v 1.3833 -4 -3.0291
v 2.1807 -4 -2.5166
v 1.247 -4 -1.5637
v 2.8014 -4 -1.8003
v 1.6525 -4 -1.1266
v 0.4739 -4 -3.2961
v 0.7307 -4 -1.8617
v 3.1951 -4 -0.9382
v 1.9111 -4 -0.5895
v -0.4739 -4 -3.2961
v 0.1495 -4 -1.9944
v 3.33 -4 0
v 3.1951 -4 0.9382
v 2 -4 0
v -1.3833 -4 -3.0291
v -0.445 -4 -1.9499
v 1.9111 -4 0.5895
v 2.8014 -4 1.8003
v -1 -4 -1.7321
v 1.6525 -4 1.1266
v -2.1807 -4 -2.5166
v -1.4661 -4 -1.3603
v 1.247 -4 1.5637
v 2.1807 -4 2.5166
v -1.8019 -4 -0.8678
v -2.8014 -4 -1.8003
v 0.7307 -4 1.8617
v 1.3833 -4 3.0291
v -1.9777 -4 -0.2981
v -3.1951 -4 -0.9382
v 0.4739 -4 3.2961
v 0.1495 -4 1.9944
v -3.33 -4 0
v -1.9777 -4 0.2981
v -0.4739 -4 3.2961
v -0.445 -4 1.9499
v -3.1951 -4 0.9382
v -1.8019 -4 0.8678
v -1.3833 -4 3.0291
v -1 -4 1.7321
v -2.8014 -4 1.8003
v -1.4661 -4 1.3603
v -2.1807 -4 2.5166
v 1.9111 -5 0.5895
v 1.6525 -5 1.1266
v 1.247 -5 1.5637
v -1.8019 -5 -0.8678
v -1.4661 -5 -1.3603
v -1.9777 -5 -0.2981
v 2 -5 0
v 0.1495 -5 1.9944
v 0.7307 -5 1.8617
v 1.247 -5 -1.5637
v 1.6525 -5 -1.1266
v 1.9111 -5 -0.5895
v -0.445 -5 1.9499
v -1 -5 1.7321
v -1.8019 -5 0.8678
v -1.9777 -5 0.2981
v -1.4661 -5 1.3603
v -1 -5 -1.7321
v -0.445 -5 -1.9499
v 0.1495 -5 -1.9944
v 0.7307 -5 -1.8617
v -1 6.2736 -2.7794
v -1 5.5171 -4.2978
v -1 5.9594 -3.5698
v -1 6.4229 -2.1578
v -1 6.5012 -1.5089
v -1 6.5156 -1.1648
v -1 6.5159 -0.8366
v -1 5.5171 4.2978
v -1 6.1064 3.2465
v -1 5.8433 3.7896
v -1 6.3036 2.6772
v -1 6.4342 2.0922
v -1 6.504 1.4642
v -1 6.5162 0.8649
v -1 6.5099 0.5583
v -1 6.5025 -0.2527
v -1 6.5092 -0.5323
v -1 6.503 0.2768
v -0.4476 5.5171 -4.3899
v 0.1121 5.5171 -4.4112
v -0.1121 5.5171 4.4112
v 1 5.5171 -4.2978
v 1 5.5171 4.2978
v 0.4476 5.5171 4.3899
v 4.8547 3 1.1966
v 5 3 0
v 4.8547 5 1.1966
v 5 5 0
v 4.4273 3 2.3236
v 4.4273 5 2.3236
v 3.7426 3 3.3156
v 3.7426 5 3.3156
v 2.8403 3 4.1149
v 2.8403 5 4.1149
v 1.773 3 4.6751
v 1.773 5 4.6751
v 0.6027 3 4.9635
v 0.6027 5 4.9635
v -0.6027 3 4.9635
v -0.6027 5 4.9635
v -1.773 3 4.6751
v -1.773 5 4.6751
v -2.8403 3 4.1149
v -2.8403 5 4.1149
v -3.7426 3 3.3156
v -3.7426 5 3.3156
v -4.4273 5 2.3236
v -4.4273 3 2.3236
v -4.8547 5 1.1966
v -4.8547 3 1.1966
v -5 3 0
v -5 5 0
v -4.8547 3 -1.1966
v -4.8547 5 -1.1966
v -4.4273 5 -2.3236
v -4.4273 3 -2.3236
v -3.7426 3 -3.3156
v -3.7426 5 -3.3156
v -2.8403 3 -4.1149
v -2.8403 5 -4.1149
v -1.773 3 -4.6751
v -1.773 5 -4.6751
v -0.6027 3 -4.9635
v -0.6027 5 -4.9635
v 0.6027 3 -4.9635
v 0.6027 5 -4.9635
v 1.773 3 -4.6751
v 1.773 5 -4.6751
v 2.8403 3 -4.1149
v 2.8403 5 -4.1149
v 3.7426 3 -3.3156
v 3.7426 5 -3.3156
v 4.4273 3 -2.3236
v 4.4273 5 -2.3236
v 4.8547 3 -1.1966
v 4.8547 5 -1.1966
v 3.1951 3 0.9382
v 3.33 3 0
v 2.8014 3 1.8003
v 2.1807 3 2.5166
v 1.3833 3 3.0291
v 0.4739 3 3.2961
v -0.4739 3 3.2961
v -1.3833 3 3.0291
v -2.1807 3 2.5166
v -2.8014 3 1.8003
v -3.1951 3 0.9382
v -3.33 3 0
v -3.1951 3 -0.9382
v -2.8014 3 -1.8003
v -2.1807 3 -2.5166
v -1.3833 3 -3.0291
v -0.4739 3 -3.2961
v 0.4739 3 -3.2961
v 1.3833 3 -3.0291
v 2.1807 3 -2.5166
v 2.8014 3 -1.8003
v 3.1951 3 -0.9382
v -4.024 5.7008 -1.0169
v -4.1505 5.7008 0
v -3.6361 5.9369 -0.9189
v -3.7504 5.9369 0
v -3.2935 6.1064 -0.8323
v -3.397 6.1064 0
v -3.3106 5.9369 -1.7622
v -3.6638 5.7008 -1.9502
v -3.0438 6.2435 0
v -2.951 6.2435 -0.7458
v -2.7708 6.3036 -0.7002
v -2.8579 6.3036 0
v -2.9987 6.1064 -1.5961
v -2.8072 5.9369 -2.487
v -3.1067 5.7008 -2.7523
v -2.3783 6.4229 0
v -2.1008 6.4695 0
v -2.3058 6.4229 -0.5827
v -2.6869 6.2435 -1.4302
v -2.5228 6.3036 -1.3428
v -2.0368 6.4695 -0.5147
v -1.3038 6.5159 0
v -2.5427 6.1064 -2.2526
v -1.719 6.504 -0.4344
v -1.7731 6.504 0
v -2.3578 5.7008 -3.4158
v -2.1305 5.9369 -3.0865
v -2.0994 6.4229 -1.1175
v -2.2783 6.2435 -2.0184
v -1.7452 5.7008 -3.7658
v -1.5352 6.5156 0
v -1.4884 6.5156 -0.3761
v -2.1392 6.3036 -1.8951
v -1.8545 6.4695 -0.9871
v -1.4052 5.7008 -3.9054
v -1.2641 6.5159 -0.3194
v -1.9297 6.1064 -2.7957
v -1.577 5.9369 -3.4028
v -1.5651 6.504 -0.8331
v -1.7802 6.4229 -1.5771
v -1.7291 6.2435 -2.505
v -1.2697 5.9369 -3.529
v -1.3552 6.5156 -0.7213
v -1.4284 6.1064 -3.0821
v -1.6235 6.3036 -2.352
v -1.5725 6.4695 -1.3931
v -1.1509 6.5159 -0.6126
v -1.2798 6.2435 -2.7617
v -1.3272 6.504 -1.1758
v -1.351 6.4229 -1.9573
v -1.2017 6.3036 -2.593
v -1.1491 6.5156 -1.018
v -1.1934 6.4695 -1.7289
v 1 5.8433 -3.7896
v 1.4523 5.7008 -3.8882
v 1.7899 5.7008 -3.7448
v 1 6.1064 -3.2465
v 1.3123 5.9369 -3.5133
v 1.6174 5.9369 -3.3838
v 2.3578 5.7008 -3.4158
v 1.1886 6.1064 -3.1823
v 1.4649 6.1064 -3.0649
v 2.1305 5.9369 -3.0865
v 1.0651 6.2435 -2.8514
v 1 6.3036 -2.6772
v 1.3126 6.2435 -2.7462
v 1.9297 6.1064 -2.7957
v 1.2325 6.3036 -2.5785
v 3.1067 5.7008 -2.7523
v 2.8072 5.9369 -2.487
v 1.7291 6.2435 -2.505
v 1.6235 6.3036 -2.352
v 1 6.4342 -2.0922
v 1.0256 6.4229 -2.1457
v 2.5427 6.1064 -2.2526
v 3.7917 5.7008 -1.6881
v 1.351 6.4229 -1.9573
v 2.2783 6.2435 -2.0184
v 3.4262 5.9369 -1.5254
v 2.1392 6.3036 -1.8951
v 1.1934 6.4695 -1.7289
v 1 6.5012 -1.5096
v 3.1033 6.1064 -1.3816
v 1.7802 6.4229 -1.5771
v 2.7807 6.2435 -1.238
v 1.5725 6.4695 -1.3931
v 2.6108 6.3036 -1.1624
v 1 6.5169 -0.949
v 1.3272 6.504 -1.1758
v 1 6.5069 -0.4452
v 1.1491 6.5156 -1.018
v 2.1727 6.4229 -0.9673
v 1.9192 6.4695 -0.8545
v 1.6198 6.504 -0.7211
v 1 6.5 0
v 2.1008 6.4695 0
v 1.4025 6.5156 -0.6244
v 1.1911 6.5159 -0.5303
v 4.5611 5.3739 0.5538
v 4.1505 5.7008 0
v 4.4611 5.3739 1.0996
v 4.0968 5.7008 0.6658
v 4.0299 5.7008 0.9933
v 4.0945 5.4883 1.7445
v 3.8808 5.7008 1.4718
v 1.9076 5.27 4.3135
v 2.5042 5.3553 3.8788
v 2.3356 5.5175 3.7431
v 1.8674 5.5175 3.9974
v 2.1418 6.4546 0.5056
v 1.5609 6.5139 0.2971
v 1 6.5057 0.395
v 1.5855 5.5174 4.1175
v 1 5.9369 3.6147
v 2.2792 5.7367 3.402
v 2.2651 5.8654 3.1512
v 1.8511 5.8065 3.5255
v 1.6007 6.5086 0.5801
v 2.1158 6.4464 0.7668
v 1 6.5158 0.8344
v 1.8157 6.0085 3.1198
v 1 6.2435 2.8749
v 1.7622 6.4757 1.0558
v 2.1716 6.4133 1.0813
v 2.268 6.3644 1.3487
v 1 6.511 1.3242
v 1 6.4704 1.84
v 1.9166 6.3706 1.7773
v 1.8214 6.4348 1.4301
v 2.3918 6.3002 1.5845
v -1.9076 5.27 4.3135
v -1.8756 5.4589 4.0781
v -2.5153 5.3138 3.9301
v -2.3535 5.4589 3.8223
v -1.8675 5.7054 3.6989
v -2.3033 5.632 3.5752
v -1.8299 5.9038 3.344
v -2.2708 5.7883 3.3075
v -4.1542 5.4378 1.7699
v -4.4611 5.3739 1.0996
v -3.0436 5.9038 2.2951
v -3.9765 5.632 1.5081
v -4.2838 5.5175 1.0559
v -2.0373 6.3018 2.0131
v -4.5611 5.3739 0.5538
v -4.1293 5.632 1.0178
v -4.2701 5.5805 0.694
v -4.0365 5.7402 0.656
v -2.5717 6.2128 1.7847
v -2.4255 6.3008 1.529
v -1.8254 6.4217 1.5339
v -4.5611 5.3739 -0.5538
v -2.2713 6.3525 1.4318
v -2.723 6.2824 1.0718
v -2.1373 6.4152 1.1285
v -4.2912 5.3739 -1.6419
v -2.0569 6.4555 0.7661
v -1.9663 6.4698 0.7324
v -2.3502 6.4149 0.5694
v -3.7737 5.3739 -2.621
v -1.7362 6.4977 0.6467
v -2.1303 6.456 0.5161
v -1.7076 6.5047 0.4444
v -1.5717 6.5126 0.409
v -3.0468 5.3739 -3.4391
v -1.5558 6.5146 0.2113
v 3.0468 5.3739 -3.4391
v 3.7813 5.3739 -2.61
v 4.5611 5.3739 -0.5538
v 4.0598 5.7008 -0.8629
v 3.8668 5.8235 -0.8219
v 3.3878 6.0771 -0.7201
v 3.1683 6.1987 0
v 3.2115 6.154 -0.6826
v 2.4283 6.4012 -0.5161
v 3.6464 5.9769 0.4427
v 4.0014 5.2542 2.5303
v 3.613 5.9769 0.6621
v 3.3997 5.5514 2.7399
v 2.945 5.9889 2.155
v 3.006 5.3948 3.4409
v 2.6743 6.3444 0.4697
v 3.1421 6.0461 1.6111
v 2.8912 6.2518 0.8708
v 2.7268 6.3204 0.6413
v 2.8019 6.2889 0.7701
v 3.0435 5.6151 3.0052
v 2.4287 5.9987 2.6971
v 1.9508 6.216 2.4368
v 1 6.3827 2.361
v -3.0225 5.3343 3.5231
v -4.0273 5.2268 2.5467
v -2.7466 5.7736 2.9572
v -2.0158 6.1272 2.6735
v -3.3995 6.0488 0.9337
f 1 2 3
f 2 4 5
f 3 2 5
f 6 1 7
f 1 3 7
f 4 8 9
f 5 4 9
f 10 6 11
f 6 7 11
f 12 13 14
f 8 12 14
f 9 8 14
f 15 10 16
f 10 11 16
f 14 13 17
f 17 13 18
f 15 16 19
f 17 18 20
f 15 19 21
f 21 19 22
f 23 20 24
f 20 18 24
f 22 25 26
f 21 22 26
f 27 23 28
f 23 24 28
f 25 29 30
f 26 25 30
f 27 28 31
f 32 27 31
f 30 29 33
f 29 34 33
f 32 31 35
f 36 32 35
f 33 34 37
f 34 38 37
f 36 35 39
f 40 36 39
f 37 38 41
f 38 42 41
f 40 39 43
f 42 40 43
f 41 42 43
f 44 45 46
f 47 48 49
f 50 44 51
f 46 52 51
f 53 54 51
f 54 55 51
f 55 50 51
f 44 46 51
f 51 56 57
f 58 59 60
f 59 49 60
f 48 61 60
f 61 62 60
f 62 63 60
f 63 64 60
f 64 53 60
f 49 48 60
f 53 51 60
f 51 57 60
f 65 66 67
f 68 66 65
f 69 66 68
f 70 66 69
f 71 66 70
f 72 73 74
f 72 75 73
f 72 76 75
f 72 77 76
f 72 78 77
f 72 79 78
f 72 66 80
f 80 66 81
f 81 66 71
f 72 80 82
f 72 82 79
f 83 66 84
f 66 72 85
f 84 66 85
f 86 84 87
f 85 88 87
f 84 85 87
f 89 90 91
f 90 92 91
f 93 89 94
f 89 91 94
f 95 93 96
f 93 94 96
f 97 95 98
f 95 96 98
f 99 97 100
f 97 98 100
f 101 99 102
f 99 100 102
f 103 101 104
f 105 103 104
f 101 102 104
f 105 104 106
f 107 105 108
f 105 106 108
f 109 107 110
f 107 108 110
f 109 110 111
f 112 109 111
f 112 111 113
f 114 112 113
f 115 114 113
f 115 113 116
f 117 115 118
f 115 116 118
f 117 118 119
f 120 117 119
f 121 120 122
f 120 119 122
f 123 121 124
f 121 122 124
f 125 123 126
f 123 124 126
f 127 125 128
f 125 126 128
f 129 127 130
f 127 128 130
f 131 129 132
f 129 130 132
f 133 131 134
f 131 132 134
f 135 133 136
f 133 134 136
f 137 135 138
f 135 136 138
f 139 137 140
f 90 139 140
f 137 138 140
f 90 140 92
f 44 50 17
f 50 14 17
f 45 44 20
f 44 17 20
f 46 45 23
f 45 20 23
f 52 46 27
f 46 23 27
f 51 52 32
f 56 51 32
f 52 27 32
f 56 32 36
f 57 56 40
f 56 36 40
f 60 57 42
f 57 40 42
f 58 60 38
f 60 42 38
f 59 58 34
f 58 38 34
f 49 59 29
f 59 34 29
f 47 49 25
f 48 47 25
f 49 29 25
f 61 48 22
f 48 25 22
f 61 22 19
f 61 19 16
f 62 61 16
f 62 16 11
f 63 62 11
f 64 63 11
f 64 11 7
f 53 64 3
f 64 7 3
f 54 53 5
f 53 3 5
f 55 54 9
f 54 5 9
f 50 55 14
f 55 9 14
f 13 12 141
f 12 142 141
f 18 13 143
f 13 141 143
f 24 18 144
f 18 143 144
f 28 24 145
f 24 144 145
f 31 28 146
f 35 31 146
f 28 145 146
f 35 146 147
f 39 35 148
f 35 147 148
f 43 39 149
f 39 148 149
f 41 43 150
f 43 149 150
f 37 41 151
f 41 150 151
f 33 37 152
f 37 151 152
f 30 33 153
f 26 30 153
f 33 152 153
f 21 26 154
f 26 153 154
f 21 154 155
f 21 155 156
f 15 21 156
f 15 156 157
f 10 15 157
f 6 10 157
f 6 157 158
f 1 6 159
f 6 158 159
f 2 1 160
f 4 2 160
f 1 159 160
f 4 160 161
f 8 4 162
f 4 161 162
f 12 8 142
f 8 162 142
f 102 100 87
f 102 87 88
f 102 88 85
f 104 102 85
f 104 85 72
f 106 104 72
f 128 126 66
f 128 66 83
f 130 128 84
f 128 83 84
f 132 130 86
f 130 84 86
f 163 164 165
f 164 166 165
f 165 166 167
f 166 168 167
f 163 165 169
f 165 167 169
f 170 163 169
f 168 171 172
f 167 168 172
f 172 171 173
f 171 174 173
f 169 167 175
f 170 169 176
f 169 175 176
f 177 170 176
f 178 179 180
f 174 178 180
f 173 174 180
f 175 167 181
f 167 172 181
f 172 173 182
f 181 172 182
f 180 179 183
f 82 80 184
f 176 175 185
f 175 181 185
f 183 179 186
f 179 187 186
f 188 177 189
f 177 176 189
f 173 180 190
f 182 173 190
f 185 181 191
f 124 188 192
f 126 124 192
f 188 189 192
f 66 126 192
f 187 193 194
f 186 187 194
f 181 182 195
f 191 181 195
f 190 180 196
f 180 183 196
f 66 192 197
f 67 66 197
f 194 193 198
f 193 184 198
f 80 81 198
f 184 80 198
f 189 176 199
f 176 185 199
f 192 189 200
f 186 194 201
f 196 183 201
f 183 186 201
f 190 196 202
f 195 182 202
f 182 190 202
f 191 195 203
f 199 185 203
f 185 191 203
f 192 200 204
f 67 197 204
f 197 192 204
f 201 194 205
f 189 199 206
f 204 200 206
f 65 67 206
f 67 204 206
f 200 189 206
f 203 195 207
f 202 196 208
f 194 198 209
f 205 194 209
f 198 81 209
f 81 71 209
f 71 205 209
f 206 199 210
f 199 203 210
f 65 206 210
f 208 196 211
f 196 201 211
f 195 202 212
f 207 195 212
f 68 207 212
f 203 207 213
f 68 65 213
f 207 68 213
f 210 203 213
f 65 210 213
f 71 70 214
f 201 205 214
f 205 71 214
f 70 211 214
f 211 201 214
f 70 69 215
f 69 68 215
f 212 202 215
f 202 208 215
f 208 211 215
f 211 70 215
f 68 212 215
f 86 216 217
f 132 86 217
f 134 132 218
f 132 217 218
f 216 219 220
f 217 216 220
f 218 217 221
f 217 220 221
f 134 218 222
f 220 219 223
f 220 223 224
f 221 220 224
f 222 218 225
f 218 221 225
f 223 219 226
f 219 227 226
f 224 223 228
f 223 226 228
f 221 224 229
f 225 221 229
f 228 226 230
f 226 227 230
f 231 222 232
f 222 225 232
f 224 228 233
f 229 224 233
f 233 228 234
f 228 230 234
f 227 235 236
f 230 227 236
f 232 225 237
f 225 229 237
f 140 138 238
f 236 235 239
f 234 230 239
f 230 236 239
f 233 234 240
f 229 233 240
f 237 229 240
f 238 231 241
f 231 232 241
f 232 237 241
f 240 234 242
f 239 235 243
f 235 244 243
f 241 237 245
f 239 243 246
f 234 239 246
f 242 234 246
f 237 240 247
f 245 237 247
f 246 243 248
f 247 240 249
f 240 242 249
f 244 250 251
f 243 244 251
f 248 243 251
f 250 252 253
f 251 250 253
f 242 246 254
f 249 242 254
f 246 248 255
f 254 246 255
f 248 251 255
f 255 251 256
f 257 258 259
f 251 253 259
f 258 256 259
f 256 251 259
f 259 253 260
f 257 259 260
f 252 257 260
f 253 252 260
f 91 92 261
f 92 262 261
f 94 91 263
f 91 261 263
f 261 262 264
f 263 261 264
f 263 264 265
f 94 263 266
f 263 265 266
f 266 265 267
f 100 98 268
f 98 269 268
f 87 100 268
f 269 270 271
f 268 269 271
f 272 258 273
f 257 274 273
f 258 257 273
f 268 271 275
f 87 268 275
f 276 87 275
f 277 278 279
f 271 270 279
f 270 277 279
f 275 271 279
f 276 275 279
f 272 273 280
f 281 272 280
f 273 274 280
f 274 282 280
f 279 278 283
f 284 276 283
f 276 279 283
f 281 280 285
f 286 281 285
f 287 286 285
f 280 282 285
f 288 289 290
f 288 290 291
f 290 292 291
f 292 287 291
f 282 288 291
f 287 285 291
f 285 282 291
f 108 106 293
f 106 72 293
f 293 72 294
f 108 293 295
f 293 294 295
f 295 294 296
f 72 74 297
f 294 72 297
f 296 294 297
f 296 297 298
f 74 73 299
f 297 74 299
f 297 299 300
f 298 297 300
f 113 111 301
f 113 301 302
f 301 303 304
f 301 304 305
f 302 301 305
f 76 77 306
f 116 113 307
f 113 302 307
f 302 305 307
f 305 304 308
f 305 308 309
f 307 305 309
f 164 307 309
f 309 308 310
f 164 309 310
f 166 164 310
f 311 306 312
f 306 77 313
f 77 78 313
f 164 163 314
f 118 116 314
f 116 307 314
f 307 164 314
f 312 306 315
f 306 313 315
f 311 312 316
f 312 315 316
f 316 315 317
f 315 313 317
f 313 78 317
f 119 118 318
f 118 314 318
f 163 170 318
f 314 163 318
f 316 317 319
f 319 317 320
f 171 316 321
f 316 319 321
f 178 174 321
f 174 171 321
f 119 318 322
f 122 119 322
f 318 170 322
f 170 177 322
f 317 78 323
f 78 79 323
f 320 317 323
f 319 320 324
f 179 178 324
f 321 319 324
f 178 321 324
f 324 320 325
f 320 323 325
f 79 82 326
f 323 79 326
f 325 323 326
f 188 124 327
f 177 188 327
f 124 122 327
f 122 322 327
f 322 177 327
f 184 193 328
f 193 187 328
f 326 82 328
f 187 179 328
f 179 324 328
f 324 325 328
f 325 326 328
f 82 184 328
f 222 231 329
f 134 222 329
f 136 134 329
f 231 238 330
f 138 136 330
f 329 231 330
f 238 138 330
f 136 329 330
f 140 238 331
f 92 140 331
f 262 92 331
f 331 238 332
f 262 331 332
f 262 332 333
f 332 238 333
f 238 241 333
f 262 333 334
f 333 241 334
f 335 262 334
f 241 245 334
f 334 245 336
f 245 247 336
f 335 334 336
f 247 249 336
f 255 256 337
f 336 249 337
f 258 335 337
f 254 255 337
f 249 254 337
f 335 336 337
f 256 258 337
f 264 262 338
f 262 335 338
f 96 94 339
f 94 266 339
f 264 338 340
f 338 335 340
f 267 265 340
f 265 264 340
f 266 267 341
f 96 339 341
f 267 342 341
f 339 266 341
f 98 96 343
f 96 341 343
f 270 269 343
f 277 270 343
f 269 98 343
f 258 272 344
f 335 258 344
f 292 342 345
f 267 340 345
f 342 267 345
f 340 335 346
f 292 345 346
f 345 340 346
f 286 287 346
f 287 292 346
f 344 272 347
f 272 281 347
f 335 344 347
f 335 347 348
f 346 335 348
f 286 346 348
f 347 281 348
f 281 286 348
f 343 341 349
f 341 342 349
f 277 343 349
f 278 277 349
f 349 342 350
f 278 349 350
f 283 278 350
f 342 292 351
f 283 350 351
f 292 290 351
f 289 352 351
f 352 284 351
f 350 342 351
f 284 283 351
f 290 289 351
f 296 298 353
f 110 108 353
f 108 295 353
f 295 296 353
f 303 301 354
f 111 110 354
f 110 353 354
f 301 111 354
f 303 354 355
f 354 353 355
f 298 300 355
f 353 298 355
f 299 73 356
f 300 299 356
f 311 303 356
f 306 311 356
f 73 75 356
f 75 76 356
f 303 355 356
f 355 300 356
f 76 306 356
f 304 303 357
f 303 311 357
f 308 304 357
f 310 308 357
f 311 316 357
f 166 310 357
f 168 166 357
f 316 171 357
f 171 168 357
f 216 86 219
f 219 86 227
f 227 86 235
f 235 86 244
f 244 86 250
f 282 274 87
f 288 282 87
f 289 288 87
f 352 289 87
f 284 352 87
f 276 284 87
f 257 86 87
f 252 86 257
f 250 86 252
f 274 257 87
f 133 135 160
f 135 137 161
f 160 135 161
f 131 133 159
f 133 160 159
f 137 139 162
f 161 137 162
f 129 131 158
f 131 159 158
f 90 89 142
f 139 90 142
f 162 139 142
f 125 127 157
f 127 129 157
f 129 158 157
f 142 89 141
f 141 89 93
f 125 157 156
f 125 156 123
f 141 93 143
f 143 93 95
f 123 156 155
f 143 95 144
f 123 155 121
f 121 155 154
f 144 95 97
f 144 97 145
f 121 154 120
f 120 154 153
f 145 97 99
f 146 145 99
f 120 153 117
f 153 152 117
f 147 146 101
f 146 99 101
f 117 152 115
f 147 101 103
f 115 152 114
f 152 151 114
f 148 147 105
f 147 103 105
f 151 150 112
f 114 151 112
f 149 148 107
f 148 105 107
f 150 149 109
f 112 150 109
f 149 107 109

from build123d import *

# Parameters (mm, degrees)
SKETCH2_R           = 1
BOSS_EXTRUDE1_DEPTH = 1
SKETCH3_W           = 2
SKETCH3_H           = 1
CUT_EXTRUDE1_DEPTH  = 5


with BuildPart() as part:
    # Sketch1 → Revolve1 (revolve)
    with BuildSketch(Plane.XY):
        with BuildLine():
            Line((0, 5), (0, -5))
            Line((0, -5), (2, -5))
            Line((2, -5), (2, -4))
            Line((2, -4), (3.33, -4))
            Line((3.33, -4), (3.33, 3))
            Line((3.33, 3), (5, 3))
            Line((5, 3), (5, 5))
            ThreePointArc((5, 5), (3.168263504, 6.198702678), (1, 6.5))
            Line((1, 6.5), (1, 5.5))
            Line((1, 5.5), (0, 5.5))
            Line((0, 5.5), (0, 5))
        make_face()
    revolve(axis=Axis((0, 5, 0), (0, -1, 0)))

    # Sketch2 → Boss-Extrude1 (add)
    with BuildSketch(Plane(origin=(0, 5.5, 0), x_dir=(1, 0, 0), z_dir=(0, 1, 0))):
        Circle(SKETCH2_R)
    extrude(amount=BOSS_EXTRUDE1_DEPTH)

    # Sketch3 → Cut-Extrude1 (cut, symmetric)
    with BuildSketch(Plane.XY):
        with Locations((0, 6.01705679)):
            Rectangle(SKETCH3_W, SKETCH3_H)
    extrude(amount=CUT_EXTRUDE1_DEPTH, both=True, mode=Mode.SUBTRACT)


solid = part.part
